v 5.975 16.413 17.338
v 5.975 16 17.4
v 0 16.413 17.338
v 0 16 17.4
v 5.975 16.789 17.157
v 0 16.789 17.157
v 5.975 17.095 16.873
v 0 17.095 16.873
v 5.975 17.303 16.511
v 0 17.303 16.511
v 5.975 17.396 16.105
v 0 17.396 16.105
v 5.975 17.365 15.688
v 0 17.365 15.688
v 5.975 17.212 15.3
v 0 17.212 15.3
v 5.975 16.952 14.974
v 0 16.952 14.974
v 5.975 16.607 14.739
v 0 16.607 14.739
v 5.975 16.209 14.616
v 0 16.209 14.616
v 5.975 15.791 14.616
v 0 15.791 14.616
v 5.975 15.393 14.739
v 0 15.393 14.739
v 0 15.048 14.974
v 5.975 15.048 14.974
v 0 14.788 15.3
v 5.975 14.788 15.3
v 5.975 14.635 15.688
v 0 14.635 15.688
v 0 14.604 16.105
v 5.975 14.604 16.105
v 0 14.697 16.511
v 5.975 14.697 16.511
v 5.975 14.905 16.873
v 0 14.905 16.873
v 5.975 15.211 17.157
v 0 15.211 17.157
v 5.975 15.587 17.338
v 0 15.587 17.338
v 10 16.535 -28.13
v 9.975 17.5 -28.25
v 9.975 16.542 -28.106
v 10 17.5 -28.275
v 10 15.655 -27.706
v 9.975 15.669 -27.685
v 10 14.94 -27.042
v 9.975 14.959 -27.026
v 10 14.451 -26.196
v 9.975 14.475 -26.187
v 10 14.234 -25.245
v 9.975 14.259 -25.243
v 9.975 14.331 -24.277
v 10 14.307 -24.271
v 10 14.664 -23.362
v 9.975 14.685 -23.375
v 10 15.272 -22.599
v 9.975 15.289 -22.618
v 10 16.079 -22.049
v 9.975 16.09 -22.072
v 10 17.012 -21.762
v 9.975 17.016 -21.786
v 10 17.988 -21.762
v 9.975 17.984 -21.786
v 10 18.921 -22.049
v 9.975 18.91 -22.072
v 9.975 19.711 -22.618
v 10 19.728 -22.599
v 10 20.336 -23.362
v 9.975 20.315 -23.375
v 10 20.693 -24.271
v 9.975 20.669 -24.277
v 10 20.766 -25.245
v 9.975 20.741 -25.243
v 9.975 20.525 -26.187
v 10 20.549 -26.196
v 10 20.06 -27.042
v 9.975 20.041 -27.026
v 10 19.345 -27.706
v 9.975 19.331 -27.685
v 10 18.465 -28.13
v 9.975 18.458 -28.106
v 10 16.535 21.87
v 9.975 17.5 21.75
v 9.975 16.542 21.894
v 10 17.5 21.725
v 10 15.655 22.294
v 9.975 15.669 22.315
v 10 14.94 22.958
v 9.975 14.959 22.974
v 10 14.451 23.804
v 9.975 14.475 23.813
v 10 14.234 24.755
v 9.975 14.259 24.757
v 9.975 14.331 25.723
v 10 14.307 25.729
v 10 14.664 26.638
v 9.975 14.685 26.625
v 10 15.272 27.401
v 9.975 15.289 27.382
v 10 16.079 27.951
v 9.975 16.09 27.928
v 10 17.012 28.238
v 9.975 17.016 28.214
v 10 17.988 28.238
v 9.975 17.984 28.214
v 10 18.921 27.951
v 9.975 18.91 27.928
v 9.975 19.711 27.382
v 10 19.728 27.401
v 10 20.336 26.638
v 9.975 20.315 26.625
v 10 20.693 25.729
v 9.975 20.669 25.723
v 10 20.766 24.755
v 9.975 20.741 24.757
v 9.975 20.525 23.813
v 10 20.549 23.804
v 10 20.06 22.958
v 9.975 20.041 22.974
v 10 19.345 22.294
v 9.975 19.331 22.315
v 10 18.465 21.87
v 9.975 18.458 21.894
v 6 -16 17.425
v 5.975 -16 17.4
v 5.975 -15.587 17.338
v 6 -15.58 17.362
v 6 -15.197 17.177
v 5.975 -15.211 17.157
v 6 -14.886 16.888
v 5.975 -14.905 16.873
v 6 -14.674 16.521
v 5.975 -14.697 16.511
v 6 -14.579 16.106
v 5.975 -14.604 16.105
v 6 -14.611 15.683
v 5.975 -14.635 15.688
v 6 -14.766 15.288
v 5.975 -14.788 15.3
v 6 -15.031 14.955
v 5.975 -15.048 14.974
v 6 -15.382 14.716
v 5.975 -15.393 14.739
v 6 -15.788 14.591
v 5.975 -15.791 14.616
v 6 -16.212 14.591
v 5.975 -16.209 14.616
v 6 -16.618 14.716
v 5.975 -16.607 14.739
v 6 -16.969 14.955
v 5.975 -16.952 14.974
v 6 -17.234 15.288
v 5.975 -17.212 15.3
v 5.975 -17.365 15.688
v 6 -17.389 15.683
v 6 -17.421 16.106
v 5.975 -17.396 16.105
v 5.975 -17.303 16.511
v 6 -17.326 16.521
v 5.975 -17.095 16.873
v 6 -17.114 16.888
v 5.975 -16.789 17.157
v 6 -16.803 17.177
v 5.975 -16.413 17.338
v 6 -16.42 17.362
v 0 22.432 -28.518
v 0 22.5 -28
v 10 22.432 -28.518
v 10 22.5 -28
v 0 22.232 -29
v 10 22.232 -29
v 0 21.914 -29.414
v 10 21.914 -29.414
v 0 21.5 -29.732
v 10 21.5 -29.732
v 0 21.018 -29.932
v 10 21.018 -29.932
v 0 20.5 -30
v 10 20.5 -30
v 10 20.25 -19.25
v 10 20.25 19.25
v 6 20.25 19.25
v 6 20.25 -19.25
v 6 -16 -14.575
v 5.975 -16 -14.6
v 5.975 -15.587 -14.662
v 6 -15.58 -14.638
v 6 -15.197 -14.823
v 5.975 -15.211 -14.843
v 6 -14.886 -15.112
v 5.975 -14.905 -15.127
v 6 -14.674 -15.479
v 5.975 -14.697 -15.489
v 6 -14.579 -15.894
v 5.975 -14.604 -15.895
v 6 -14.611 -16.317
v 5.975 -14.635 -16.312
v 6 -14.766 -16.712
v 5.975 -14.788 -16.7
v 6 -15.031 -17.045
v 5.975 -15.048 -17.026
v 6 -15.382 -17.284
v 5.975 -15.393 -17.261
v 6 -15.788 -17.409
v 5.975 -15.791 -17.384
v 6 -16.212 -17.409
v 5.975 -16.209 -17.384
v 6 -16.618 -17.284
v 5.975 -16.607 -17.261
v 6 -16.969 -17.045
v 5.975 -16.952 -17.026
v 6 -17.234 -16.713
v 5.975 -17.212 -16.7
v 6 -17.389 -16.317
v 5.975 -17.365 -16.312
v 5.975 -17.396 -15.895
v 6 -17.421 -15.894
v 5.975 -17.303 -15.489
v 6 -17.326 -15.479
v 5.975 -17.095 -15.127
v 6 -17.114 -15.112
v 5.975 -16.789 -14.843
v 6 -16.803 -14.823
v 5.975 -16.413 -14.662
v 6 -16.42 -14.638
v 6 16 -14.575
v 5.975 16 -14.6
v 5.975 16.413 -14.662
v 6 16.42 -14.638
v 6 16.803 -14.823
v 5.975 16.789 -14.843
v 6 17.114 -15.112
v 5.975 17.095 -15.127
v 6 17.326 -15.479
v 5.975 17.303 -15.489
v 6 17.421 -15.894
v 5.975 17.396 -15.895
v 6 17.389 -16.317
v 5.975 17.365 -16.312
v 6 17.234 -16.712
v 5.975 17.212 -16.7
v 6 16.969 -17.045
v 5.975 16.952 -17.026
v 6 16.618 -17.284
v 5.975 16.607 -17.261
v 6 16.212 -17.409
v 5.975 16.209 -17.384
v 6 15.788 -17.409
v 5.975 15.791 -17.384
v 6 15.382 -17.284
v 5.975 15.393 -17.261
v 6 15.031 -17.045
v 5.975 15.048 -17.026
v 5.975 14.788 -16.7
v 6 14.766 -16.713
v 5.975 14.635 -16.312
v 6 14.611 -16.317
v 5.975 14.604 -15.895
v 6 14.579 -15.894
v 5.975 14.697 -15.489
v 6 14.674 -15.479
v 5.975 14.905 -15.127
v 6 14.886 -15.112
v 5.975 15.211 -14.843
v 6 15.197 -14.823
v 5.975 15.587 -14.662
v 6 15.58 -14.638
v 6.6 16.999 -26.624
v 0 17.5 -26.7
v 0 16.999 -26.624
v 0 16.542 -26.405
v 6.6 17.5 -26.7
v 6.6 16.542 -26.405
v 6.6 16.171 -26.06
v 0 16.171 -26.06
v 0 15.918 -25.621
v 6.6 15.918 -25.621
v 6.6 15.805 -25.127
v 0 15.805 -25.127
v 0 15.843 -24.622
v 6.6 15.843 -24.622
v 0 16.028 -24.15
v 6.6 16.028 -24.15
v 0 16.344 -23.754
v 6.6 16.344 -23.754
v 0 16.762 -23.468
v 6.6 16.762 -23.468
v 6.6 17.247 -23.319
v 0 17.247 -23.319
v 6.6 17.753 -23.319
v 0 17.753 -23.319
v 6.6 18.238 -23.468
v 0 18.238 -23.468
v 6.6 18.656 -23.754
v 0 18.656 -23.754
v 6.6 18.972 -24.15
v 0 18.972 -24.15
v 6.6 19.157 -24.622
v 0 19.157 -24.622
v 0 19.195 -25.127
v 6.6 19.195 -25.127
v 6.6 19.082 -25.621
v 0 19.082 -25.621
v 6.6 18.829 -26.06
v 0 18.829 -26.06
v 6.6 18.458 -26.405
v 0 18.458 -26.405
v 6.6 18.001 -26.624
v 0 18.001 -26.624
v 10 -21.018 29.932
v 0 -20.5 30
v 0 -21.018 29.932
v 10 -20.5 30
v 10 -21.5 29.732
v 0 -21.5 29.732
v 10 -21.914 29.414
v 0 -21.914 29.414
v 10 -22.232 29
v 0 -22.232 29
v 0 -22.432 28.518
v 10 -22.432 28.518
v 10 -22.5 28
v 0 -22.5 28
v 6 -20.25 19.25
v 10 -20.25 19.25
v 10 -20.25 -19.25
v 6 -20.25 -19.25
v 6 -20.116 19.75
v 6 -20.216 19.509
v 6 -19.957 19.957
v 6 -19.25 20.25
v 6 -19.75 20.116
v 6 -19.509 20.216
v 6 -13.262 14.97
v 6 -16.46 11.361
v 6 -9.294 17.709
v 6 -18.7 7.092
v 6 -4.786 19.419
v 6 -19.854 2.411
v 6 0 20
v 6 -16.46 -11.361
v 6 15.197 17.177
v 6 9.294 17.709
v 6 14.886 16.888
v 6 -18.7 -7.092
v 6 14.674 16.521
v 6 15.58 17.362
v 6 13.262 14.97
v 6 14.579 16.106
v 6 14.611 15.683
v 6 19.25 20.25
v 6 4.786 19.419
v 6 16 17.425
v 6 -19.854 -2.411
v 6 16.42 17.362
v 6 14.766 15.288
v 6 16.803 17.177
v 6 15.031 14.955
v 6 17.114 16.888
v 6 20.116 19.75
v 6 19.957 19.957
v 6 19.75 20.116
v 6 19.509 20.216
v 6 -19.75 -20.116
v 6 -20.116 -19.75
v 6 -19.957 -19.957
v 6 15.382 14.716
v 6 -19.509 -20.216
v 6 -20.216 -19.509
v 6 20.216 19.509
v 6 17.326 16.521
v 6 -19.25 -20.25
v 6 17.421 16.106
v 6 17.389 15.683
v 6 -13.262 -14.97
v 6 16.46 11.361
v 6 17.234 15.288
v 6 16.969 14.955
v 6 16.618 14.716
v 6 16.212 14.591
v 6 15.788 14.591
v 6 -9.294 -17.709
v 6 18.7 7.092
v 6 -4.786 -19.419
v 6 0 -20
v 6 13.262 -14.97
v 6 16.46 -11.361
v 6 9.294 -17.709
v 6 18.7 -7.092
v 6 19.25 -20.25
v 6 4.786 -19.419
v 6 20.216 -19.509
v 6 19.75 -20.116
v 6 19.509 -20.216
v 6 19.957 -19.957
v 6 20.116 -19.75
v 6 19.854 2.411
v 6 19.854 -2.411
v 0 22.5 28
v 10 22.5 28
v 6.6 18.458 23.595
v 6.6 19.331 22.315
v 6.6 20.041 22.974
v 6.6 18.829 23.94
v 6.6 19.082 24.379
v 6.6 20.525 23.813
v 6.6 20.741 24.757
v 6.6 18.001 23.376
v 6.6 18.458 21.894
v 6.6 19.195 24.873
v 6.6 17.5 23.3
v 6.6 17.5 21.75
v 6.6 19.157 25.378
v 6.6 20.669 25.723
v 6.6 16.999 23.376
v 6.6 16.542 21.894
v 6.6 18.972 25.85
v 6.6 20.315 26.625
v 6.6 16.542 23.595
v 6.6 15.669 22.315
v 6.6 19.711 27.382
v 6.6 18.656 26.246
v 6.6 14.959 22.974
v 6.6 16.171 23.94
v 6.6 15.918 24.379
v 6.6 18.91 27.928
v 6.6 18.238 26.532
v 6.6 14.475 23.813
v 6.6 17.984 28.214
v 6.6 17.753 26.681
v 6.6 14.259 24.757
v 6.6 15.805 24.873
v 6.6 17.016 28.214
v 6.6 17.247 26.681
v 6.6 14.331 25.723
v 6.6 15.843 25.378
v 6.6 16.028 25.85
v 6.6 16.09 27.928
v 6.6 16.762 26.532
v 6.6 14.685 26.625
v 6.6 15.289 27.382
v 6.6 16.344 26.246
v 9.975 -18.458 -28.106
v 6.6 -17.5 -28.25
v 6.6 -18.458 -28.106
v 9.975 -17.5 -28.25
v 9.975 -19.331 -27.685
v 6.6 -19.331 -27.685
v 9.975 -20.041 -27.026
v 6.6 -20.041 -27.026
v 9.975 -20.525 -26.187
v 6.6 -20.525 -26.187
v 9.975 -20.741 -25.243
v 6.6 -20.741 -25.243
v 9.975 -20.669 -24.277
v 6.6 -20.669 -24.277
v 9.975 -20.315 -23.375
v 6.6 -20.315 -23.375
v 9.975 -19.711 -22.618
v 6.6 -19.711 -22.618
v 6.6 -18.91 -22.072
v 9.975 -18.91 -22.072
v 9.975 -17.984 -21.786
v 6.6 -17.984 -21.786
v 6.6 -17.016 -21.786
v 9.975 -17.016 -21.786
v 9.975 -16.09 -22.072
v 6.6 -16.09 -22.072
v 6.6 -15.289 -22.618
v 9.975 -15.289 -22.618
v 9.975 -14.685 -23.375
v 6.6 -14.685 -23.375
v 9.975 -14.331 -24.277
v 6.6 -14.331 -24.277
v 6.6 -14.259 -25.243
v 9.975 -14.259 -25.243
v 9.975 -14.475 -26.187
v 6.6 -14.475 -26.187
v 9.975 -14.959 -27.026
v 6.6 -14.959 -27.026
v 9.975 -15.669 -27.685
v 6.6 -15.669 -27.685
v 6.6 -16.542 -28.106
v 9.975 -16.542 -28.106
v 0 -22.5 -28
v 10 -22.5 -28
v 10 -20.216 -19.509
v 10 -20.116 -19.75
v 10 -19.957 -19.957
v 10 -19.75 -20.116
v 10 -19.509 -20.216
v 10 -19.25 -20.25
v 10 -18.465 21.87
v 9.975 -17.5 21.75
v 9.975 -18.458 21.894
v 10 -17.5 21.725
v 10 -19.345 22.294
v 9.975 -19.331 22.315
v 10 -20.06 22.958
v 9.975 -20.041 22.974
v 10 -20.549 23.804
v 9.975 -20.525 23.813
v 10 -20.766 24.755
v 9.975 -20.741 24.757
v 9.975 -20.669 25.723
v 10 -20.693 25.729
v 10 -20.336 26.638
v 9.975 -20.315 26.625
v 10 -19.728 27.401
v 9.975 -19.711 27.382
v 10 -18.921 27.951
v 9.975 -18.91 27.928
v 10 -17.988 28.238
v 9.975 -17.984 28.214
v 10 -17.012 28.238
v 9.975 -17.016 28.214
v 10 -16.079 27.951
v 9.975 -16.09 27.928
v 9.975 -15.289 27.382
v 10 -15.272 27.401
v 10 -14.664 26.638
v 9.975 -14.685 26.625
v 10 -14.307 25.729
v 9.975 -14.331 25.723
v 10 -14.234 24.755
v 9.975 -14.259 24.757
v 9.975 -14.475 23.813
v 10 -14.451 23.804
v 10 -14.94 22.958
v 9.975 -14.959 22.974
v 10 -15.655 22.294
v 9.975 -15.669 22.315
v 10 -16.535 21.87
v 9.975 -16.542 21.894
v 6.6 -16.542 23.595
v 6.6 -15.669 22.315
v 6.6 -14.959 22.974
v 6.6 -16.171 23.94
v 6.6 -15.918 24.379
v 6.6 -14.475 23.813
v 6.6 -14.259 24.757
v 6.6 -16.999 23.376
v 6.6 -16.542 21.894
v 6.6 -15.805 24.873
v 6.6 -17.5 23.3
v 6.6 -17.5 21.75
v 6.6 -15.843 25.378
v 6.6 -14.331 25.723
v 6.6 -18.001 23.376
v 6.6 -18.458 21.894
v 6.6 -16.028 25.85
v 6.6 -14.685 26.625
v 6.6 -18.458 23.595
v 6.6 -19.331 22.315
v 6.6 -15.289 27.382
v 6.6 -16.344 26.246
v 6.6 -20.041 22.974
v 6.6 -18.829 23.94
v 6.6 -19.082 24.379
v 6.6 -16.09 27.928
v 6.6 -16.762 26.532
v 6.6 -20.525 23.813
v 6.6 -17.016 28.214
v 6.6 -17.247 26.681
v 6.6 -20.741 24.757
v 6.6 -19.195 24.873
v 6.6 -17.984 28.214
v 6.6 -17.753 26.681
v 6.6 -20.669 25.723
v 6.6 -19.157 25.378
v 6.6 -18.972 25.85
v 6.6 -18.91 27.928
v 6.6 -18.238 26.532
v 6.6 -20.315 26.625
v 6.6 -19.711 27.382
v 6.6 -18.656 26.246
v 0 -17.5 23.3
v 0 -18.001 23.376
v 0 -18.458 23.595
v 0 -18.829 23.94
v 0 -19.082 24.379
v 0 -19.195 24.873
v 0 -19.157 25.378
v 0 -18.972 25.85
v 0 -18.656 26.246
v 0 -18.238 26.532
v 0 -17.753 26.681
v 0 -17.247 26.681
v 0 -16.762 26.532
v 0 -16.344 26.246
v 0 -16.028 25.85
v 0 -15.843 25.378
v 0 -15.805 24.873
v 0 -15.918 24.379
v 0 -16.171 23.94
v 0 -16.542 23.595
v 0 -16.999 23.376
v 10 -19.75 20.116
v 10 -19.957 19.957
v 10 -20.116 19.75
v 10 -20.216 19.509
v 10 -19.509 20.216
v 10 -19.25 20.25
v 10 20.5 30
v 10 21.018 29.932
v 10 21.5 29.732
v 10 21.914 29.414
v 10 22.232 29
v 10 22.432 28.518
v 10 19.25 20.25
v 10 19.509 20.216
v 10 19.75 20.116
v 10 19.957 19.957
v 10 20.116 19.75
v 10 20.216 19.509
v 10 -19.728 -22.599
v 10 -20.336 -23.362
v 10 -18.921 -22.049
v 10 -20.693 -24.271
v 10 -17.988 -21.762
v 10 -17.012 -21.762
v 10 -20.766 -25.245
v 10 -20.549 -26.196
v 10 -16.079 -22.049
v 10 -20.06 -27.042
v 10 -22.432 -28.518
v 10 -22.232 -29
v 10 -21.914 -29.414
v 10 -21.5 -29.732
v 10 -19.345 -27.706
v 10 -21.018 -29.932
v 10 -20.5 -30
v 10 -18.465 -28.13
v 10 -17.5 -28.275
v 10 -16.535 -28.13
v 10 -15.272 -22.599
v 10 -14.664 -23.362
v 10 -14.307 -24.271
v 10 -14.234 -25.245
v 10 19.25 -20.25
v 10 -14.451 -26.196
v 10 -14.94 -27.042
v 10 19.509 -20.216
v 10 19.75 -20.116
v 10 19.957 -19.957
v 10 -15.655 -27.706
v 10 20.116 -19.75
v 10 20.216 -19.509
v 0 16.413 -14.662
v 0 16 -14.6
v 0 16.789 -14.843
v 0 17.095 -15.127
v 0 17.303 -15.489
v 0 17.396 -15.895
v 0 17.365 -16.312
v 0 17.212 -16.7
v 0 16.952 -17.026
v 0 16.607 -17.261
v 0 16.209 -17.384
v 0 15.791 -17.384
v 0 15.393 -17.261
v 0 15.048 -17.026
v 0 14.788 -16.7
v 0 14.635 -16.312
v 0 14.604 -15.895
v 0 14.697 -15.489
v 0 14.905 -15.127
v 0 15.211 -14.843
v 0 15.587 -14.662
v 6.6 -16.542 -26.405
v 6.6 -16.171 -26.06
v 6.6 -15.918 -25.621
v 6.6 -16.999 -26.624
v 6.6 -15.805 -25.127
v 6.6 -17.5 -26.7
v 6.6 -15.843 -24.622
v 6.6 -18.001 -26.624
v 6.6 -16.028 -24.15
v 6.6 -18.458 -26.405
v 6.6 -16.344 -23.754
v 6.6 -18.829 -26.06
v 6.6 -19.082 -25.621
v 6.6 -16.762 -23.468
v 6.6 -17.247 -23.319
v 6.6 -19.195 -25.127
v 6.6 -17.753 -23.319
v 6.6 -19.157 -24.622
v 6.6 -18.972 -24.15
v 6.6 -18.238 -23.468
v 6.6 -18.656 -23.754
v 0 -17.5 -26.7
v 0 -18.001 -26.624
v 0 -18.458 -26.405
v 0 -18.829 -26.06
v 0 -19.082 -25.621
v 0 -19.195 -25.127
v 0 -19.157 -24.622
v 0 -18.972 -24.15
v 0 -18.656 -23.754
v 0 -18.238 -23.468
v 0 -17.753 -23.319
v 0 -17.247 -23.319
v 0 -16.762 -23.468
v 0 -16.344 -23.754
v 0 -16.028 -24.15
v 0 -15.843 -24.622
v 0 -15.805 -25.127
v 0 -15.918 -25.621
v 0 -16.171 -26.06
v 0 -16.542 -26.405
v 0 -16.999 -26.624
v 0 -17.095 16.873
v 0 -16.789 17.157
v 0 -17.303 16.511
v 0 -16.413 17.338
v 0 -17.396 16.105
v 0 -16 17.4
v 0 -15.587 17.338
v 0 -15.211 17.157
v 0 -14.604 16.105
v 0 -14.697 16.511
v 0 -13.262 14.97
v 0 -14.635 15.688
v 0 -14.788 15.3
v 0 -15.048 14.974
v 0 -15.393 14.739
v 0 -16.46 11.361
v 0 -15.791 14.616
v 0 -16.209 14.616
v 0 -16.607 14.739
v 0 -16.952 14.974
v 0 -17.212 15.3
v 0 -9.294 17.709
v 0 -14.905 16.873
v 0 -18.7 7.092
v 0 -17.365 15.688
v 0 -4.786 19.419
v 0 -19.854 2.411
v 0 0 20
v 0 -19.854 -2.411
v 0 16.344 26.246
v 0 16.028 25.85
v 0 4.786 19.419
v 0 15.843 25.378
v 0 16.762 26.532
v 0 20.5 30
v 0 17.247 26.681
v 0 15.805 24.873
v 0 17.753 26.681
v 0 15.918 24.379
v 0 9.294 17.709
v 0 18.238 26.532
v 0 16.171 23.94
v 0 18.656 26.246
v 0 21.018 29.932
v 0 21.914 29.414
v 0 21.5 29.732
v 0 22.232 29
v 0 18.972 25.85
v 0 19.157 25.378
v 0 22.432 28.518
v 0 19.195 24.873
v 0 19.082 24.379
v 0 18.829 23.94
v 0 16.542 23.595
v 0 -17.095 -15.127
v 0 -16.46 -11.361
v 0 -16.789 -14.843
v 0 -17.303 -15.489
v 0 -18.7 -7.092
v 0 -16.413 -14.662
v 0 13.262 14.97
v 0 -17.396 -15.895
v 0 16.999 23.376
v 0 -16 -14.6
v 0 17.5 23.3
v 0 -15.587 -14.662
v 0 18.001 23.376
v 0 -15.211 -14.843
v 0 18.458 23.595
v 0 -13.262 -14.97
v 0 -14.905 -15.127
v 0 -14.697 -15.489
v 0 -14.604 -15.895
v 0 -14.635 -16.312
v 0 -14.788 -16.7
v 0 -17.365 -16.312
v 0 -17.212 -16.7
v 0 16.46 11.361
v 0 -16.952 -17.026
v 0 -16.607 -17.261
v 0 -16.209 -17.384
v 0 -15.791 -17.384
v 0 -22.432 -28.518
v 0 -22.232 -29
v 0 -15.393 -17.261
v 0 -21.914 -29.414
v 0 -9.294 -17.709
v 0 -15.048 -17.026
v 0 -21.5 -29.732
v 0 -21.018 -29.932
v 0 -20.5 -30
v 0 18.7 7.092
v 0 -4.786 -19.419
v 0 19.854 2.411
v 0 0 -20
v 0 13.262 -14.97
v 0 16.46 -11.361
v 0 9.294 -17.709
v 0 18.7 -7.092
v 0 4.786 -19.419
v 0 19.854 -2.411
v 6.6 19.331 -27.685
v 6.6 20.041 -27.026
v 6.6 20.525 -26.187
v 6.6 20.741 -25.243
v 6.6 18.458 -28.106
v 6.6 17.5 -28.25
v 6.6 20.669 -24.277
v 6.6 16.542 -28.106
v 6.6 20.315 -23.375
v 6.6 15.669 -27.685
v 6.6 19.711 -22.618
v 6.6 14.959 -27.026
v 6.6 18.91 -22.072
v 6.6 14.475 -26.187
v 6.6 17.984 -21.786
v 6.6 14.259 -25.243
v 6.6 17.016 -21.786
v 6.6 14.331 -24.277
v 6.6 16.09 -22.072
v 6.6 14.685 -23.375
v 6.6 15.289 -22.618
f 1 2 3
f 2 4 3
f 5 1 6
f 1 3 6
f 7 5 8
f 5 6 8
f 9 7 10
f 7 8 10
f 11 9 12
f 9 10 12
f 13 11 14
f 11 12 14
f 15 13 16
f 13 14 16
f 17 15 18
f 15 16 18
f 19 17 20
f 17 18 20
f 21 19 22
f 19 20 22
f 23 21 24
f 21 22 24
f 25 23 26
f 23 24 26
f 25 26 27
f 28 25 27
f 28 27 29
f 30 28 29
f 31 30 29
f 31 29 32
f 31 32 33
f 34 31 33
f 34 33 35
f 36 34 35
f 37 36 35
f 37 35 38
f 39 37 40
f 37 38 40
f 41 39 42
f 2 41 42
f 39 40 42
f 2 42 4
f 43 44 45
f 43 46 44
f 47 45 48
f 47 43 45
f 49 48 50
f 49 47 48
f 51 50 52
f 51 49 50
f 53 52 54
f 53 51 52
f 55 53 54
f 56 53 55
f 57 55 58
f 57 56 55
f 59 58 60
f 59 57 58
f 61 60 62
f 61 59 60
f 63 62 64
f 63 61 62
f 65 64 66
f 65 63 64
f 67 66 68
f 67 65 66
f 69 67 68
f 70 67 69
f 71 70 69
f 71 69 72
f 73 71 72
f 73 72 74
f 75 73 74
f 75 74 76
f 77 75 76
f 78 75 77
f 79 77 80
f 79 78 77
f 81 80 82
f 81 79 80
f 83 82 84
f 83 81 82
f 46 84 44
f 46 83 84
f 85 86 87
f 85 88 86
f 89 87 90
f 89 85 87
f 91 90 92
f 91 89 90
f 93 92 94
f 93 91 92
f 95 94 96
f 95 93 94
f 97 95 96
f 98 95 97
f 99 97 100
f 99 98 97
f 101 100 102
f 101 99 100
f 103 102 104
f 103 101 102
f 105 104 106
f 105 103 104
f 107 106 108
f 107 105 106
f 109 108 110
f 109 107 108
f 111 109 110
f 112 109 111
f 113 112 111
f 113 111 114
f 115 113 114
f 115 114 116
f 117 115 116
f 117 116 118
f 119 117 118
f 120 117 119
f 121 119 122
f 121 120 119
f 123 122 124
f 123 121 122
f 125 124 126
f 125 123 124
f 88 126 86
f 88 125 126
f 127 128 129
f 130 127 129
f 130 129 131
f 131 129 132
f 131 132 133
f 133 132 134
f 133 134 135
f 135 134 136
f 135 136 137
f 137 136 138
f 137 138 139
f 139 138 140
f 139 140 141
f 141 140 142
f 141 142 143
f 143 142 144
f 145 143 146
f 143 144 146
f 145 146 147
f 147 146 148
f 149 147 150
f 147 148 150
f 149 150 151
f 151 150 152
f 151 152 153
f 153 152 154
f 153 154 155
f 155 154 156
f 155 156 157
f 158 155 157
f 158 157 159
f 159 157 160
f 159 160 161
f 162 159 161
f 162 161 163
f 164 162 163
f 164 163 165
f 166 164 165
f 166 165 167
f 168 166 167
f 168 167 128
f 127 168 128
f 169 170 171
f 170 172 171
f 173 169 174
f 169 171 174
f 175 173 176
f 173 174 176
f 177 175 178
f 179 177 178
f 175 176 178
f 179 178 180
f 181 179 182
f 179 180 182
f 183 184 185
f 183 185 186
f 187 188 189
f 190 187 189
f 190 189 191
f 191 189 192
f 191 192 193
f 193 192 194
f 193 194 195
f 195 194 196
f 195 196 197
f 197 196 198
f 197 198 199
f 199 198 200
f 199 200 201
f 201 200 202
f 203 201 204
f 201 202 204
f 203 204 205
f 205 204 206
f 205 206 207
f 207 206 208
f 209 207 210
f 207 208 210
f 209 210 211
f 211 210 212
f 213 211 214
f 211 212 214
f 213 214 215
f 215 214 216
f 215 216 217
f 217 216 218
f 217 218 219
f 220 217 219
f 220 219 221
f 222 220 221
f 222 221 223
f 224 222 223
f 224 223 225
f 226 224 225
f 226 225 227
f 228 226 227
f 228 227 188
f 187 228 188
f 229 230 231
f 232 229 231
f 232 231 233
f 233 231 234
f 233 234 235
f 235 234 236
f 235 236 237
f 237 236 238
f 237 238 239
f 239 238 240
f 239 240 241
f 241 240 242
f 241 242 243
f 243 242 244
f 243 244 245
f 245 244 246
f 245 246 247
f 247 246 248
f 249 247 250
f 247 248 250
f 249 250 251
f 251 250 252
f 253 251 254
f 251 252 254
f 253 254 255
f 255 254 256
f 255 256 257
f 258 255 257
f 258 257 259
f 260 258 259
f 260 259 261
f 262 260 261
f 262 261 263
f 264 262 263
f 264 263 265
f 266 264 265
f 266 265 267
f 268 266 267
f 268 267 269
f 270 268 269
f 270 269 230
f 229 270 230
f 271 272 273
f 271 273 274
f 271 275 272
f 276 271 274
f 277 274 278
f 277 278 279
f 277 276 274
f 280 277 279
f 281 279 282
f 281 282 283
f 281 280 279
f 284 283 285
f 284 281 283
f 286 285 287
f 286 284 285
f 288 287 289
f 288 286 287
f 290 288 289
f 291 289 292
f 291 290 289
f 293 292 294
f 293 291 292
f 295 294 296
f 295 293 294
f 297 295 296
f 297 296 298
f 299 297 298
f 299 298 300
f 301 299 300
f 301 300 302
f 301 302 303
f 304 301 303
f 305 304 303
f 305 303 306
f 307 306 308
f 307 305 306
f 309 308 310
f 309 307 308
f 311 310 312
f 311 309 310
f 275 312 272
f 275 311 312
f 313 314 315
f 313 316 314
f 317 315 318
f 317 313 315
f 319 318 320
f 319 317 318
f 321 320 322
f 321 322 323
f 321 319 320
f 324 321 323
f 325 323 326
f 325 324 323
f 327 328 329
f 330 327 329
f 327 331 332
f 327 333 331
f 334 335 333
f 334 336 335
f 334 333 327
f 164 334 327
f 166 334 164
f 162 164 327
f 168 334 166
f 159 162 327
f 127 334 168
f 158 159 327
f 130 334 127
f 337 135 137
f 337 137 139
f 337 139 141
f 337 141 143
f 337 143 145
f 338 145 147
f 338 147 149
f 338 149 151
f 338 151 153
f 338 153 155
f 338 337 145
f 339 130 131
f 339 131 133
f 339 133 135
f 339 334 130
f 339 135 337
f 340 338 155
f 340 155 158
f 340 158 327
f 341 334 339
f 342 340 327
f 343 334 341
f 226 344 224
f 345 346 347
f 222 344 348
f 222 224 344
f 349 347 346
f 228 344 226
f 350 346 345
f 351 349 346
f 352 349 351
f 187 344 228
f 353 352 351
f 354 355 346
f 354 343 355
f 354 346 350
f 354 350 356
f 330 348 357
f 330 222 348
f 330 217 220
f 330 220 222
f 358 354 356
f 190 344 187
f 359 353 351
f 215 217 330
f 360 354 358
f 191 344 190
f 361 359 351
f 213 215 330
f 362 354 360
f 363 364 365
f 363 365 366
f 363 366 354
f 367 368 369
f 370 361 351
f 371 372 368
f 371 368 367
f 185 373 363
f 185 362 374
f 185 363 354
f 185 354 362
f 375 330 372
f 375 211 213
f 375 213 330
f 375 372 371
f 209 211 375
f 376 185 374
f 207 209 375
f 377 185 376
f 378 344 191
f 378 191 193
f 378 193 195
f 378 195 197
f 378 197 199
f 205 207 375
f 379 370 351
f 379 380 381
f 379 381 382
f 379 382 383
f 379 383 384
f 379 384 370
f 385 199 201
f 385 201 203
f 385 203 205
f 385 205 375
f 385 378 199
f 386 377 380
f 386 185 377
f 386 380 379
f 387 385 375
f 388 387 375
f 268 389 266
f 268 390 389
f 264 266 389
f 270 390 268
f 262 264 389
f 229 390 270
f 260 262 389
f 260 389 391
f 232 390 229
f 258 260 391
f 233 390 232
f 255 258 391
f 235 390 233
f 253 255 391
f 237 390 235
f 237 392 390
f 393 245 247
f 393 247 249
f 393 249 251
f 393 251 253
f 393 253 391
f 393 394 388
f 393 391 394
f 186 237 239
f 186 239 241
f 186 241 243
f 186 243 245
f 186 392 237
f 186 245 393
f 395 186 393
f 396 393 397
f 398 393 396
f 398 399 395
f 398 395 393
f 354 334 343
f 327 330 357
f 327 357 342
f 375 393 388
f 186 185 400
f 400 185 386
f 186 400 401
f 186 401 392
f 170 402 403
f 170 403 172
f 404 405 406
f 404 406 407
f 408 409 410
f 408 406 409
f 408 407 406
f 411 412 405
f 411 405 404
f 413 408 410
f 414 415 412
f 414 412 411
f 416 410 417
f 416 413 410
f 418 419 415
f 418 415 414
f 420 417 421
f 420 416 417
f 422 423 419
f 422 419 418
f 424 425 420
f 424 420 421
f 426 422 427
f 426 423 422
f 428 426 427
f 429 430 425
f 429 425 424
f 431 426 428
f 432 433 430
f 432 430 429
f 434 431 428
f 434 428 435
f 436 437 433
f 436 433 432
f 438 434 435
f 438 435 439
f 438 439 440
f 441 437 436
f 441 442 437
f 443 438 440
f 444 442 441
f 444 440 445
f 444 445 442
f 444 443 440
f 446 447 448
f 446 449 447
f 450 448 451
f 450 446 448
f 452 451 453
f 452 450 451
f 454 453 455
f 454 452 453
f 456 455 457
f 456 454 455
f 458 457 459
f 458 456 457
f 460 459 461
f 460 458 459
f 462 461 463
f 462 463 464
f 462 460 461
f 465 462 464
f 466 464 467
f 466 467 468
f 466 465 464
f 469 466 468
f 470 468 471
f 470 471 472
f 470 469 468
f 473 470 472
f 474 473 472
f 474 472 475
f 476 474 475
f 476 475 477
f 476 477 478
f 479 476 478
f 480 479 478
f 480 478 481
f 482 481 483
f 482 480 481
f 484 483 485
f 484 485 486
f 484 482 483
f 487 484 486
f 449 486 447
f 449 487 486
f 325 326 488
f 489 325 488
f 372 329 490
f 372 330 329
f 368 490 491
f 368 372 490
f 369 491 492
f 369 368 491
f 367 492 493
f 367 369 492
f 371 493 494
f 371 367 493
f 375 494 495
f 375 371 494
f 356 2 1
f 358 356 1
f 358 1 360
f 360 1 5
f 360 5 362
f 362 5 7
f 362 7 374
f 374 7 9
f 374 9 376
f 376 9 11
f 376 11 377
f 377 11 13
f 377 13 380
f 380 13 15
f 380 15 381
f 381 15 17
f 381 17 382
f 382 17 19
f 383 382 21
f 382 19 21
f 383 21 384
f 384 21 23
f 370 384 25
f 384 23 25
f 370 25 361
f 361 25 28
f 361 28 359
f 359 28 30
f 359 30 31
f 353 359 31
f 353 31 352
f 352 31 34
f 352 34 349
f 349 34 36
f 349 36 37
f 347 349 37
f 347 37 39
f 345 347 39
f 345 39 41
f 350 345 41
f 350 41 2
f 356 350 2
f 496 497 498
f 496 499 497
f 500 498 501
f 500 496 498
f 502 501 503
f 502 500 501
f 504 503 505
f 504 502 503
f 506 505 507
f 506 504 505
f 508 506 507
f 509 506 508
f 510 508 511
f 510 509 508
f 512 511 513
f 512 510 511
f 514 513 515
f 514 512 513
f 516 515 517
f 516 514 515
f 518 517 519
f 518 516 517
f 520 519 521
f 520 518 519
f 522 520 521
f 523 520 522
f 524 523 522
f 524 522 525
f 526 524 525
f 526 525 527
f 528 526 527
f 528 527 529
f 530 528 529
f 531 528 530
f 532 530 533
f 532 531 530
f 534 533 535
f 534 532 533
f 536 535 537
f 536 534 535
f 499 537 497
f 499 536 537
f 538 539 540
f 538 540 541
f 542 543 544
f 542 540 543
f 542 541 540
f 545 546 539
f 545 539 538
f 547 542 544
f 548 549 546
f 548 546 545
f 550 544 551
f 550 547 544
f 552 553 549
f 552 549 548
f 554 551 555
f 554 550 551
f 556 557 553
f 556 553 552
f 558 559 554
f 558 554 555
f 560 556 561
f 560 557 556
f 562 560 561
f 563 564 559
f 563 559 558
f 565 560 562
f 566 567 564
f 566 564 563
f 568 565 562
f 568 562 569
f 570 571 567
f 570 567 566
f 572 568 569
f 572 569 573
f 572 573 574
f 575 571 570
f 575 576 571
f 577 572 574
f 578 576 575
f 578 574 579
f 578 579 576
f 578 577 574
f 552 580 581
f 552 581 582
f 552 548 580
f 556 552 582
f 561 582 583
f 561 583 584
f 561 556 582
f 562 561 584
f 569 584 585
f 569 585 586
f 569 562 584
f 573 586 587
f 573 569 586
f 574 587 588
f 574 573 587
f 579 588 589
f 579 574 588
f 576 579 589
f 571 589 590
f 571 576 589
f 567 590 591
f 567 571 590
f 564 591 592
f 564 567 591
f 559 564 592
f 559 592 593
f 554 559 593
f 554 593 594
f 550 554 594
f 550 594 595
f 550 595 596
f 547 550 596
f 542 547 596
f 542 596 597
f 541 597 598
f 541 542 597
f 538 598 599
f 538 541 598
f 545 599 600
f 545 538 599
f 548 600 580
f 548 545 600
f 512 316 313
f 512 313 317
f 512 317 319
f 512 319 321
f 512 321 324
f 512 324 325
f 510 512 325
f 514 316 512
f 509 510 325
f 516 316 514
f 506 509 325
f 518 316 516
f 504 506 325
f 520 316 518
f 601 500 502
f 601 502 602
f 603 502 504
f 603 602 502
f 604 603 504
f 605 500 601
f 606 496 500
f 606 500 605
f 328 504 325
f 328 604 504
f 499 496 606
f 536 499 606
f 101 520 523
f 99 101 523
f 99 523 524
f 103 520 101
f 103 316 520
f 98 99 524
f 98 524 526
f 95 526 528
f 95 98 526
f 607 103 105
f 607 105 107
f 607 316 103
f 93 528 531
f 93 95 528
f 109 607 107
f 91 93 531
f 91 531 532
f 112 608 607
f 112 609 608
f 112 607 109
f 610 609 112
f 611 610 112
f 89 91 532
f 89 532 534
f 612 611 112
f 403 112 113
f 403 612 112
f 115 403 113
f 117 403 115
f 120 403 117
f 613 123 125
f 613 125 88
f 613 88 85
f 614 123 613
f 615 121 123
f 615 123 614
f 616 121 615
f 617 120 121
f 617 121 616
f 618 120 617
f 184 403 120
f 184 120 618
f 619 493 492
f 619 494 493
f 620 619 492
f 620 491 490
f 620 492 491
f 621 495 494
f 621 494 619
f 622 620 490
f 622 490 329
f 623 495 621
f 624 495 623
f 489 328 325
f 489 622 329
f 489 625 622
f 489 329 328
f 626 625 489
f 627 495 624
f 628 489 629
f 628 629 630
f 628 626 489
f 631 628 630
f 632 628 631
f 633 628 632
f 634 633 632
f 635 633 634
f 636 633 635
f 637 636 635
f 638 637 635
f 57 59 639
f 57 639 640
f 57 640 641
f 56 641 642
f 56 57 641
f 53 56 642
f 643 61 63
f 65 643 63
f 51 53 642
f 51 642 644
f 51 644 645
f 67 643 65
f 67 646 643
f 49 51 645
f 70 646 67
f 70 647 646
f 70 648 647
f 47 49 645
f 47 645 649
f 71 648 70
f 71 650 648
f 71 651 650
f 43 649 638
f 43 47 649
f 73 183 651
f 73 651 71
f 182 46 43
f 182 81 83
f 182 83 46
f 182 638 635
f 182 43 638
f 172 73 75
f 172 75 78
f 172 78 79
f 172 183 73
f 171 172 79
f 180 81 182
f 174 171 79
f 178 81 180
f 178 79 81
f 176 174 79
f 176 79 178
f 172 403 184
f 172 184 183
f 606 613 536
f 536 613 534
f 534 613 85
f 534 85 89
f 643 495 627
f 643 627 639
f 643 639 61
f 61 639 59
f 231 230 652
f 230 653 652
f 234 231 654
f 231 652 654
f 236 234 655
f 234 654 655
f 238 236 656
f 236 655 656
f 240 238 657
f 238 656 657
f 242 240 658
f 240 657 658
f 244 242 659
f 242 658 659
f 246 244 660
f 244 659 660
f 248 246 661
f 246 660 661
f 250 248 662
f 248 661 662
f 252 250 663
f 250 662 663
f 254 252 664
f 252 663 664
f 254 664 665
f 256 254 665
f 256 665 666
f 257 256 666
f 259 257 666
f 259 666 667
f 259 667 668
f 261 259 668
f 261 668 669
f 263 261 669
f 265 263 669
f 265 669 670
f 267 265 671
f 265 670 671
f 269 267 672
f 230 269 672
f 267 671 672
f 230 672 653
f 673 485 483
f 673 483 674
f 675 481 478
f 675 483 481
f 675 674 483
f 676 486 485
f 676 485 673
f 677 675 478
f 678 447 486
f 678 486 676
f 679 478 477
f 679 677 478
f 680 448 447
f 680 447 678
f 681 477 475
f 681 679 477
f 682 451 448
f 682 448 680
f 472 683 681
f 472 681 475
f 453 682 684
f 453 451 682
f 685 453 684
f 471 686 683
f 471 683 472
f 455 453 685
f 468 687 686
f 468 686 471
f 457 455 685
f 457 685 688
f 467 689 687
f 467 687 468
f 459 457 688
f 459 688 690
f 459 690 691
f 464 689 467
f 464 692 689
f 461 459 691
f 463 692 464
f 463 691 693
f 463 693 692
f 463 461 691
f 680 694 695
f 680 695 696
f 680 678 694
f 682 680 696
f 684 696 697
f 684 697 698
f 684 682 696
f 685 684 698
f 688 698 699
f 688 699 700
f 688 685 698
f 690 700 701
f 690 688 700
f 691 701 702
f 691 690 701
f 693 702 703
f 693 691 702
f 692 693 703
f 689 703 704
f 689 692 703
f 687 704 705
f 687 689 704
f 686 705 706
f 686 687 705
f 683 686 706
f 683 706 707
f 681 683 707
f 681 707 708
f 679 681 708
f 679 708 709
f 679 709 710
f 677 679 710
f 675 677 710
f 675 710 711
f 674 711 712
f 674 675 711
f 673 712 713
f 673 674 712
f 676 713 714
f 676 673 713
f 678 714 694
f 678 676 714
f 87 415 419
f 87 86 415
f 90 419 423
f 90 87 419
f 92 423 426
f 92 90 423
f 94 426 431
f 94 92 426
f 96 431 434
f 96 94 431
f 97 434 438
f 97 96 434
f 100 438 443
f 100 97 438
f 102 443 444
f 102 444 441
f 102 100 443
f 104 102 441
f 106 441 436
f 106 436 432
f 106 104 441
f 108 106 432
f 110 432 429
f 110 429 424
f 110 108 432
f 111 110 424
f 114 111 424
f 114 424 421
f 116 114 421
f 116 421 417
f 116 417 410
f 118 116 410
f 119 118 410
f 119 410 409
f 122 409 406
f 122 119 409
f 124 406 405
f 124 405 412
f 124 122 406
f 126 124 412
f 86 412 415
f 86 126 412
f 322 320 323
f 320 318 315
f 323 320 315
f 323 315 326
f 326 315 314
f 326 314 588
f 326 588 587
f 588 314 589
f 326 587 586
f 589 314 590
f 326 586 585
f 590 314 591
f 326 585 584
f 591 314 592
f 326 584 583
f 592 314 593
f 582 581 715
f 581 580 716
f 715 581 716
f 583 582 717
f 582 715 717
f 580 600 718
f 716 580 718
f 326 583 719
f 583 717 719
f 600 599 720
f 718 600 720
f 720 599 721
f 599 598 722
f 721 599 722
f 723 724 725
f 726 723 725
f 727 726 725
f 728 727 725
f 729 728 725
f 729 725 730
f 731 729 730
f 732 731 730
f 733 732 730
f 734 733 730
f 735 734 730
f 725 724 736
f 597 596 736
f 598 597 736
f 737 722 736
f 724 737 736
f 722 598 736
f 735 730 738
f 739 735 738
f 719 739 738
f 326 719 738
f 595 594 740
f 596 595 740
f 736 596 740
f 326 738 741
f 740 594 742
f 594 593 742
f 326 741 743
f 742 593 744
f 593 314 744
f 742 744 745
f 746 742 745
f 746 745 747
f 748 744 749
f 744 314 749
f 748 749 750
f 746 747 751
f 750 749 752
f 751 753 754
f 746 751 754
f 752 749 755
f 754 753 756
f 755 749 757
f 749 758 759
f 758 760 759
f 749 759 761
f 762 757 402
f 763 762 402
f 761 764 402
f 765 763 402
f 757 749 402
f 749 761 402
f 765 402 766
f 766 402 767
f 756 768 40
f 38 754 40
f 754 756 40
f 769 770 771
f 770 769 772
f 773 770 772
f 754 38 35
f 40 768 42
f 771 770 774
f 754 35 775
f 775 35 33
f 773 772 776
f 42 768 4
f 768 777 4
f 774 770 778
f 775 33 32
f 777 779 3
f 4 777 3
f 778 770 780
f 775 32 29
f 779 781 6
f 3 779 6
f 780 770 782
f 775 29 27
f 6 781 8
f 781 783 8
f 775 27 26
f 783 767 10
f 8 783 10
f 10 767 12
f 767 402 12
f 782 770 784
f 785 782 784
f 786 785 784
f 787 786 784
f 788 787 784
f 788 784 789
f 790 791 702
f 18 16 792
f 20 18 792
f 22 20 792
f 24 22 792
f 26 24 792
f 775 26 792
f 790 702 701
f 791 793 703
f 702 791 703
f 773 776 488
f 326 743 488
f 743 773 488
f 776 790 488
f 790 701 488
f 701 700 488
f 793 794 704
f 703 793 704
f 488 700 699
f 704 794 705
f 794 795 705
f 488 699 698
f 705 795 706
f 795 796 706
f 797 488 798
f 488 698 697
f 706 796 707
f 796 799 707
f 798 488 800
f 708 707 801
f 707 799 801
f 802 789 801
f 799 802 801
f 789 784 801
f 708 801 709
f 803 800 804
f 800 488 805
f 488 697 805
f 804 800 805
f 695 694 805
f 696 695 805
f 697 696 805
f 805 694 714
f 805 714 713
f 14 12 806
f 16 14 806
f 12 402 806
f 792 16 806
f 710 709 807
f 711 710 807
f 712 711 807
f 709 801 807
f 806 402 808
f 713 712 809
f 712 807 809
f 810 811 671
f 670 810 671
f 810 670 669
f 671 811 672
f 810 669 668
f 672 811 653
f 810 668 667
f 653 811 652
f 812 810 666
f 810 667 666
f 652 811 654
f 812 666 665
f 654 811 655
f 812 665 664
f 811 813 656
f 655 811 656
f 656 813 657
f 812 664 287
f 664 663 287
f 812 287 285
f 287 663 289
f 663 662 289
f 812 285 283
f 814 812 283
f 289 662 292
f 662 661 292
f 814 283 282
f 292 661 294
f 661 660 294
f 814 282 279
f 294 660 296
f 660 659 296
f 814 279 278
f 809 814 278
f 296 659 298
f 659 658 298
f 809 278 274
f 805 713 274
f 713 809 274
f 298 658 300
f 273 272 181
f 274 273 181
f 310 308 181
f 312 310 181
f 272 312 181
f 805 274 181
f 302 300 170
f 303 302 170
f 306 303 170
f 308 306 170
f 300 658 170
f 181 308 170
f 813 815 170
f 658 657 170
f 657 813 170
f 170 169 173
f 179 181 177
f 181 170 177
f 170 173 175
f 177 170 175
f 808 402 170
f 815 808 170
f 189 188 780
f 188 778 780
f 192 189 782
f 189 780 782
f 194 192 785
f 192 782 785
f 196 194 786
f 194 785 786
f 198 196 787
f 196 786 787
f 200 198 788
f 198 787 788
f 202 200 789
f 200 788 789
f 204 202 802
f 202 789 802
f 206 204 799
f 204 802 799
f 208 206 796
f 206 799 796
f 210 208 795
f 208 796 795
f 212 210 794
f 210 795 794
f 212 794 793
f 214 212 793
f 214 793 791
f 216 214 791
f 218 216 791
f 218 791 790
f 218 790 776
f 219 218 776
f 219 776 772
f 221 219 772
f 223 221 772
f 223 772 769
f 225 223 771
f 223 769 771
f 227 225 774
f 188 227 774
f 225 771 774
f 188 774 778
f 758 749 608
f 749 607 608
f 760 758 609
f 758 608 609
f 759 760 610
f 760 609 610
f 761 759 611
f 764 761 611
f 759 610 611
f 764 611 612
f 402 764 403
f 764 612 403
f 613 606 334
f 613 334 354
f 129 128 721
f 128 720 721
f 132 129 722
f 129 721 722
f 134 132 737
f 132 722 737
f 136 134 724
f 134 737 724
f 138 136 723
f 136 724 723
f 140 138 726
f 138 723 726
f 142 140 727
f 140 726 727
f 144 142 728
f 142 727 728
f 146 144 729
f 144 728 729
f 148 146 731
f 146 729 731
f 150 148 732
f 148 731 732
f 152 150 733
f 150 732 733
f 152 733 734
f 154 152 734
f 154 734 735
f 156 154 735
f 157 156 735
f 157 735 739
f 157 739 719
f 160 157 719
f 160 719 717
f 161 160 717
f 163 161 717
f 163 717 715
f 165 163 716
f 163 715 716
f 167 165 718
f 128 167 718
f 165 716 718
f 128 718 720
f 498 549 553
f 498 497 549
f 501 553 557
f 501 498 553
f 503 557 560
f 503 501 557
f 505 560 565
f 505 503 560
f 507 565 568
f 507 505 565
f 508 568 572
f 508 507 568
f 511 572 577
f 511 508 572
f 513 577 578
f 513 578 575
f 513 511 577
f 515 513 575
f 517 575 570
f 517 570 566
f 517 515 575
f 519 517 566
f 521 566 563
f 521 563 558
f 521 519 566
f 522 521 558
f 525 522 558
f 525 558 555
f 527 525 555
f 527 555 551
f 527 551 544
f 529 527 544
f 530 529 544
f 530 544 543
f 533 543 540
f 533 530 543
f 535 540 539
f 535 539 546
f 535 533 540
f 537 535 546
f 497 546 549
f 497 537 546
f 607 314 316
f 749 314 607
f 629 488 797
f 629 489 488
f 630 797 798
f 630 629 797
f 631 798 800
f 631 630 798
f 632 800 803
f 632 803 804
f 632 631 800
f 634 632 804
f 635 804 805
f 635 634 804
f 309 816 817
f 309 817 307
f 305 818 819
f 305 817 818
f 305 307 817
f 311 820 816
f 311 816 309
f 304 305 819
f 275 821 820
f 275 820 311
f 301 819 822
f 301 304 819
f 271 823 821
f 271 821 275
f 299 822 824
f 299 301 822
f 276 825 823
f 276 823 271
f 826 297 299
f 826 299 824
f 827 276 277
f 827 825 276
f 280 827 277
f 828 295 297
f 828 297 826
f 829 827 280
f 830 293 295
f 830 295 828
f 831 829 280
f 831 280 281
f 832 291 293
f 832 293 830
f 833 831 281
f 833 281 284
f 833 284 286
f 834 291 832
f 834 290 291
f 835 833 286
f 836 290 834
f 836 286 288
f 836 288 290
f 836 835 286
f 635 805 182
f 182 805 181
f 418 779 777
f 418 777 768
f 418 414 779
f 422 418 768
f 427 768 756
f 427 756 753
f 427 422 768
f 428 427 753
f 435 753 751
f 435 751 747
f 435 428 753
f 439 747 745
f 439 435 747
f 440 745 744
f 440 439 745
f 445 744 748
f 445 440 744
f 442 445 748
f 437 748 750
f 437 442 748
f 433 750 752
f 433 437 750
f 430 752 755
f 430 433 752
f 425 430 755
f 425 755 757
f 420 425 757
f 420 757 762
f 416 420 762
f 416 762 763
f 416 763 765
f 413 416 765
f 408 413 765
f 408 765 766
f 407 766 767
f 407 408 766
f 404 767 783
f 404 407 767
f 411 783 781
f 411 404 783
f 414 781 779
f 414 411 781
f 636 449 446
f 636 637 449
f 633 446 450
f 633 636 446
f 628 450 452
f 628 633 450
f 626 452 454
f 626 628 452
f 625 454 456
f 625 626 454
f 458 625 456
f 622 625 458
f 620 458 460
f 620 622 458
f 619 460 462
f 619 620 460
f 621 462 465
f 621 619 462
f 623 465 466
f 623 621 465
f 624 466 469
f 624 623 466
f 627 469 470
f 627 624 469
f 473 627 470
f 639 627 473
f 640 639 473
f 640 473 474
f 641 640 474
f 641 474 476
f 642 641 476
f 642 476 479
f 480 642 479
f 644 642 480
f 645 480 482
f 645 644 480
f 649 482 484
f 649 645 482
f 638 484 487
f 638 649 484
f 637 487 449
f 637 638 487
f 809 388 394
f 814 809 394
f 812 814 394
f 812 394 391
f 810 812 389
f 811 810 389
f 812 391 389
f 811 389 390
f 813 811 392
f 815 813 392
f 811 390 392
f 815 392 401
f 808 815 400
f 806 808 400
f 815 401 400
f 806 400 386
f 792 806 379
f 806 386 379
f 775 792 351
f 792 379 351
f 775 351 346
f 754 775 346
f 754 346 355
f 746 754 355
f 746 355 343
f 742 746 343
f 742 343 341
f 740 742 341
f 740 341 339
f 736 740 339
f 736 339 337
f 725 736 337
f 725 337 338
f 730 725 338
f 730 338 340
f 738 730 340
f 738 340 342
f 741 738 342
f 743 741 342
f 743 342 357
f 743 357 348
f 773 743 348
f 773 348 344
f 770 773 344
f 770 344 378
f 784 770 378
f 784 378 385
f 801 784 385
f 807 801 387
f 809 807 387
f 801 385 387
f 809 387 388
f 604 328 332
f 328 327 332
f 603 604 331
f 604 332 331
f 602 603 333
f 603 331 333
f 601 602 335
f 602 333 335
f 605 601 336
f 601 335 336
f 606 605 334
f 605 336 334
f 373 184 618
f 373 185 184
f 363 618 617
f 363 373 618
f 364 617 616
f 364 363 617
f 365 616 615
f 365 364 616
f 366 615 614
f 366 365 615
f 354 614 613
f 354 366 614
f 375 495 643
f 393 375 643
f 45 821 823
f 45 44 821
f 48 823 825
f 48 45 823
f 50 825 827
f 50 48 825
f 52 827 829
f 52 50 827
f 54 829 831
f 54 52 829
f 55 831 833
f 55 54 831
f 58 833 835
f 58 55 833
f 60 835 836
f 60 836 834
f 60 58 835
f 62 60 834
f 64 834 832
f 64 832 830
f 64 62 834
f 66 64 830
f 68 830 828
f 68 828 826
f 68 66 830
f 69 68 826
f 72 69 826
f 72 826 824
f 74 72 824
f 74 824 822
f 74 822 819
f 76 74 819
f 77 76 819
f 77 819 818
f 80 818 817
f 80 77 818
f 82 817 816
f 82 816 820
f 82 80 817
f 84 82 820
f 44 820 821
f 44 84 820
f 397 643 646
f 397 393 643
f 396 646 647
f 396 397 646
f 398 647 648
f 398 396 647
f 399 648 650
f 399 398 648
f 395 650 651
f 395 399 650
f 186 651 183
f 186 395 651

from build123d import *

# Parameters (mm, degrees)
SKETCH1_W                                    = 60
SKETCH1_H                                    = 45
BOSS_EXTRUDE1_DEPTH                          = 10
SKETCH2_W                                    = 40.5
SKETCH2_H                                    = 40.5
CUT_EXTRUDE1_DEPTH                           = 4
SKETCH3_R                                    = 20
CUT_EXTRUDE2_DEPTH                           = 10
FILLET1_R                                    = 1
F_2_8_2_8_DIAMETER_HOLE1_D                   = 2.8
F_2_8_2_8_DIAMETER_HOLE1_CSINK_D             = 2.85
F_2_8_2_8_DIAMETER_HOLE1_CSINK_ANGLE         = 90
CBORE_FOR_M3_HEX_SOCKET_HEAD_CAP_SCR_2_COUNT = 2
CBORE_FOR_M3_HEX_SOCKET_HEAD_CAP_SCR_2_PITCH = 30.516389039
CBORE_FOR_M3_HEX_SOCKET_HEAD_CAP_SCR_3_COUNT = 2
CBORE_FOR_M3_HEX_SOCKET_HEAD_CAP_SCR_3_PITCH = 61.032778079
CBORE_FOR_M3_HEX_SOCKET_HEAD_CAP_SCR_4_COUNT = 2
CBORE_FOR_M3_HEX_SOCKET_HEAD_CAP_SCR_4_PITCH = 50
CBORE_FOR_M3_HEX_SOCKET_HEAD_CAP_SCR_5_COUNT = 2
CBORE_FOR_M3_HEX_SOCKET_HEAD_CAP_SCR_5_PITCH = 35
FILLET3_R                                    = 2


with BuildPart() as part:
    # Sketch1 → Boss-Extrude1 (new body)
    with BuildSketch(Plane(origin=(0, 0, 0), x_dir=(0, 0, -1), z_dir=(1, 0, 0))):
        Rectangle(SKETCH1_W, SKETCH1_H)
    extrude(amount=BOSS_EXTRUDE1_DEPTH)

    # Sketch2 → Cut-Extrude1 (cut)
    with BuildSketch(Plane(origin=(10, 0, 0), x_dir=(0, 0, -1), z_dir=(1, 0, 0))):
        Rectangle(SKETCH2_W, SKETCH2_H)
    extrude(amount=-CUT_EXTRUDE1_DEPTH, mode=Mode.SUBTRACT)

    # Sketch3 → Cut-Extrude2 (cut)
    with BuildSketch(Plane(origin=(6, 0, 0), x_dir=(0, 0, -1), z_dir=(1, 0, 0))):
        Circle(SKETCH3_R)
    extrude(amount=-CUT_EXTRUDE2_DEPTH, mode=Mode.SUBTRACT)

    # Fillet1
    fillet1_edges = [part.edges().sort_by_distance(p)[0] for p in [
        (8, 20.25, -20.25),
        (8, -20.25, -20.25),
        (8, -20.25, 20.25),
        (8, 20.25, 20.25),
    ]]
    fillet(fillet1_edges, radius=FILLET1_R)

    # Ø2.8 (2.8) Diameter Hole1 (through all)
    with Locations(Plane(origin=(6, 0, 0), x_dir=(0, 0, -1), z_dir=(1, 0, 0))):
        with Locations((0, 0), (16, -16), (-16, 16), (-16, -16), (16, 16)):
            CounterSinkHole(F_2_8_2_8_DIAMETER_HOLE1_D / 2, F_2_8_2_8_DIAMETER_HOLE1_CSINK_D / 2, counter_sink_angle=F_2_8_2_8_DIAMETER_HOLE1_CSINK_ANGLE)

    # Sketch14 → CBORE for M3 Hex Socket Head Cap Screw2 (revolve, cut)
    with BuildSketch(Plane(origin=(10, -17.5, -25), x_dir=(0, 0, -1), z_dir=(0, 1, 0))):
        Polygon((0, 0), (0, 10), (1.7, 10), (1.7, 3.4), (3.25, 3.4), (3.25, 0.025), (3.275, 0), align=None)
    cbore_for_m3_hex_socket_head_cap_screw2 = revolve(axis=Axis((16.35, -17.5, -25), (-1, 0, 0)), mode=Mode.SUBTRACT)

    # CBORE for M3 Hex Socket Head Cap Scr 2: CBORE for M3 Hex Socket Head Cap Screw2 ×2
    with Locations(*[Vector(0, 0.5734623443633283, 0.8192319205190406) * (i * CBORE_FOR_M3_HEX_SOCKET_HEAD_CAP_SCR_2_PITCH) for i in range(1, CBORE_FOR_M3_HEX_SOCKET_HEAD_CAP_SCR_2_COUNT)]):
        add(cbore_for_m3_hex_socket_head_cap_screw2, mode=Mode.SUBTRACT)

    # CBORE for M3 Hex Socket Head Cap Scr 3: CBORE for M3 Hex Socket Head Cap Screw2 ×2
    with Locations(*[Vector(0, 0.5734623443633283, 0.8192319205190406) * (i * CBORE_FOR_M3_HEX_SOCKET_HEAD_CAP_SCR_3_PITCH) for i in range(1, CBORE_FOR_M3_HEX_SOCKET_HEAD_CAP_SCR_3_COUNT)]):
        add(cbore_for_m3_hex_socket_head_cap_screw2, mode=Mode.SUBTRACT)

    # CBORE for M3 Hex Socket Head Cap Scr 4: CBORE for M3 Hex Socket Head Cap Screw2 ×2
    with Locations(*[(0, 0, i * CBORE_FOR_M3_HEX_SOCKET_HEAD_CAP_SCR_4_PITCH) for i in range(1, CBORE_FOR_M3_HEX_SOCKET_HEAD_CAP_SCR_4_COUNT)]):
        add(cbore_for_m3_hex_socket_head_cap_screw2, mode=Mode.SUBTRACT)

    # CBORE for M3 Hex Socket Head Cap Scr 5: CBORE for M3 Hex Socket Head Cap Screw2 ×2
    with Locations(*[(0, i * CBORE_FOR_M3_HEX_SOCKET_HEAD_CAP_SCR_5_PITCH, 0) for i in range(1, CBORE_FOR_M3_HEX_SOCKET_HEAD_CAP_SCR_5_COUNT)]):
        add(cbore_for_m3_hex_socket_head_cap_screw2, mode=Mode.SUBTRACT)

    # Fillet3
    fillet3_edges = [part.edges().sort_by_distance(p)[0] for p in [
        (5, -22.5, -30),
        (5, -22.5, 30),
        (5, 22.5, 30),
        (5, 22.5, -30),
    ]]
    fillet(fillet3_edges, radius=FILLET3_R)


solid = part.part
